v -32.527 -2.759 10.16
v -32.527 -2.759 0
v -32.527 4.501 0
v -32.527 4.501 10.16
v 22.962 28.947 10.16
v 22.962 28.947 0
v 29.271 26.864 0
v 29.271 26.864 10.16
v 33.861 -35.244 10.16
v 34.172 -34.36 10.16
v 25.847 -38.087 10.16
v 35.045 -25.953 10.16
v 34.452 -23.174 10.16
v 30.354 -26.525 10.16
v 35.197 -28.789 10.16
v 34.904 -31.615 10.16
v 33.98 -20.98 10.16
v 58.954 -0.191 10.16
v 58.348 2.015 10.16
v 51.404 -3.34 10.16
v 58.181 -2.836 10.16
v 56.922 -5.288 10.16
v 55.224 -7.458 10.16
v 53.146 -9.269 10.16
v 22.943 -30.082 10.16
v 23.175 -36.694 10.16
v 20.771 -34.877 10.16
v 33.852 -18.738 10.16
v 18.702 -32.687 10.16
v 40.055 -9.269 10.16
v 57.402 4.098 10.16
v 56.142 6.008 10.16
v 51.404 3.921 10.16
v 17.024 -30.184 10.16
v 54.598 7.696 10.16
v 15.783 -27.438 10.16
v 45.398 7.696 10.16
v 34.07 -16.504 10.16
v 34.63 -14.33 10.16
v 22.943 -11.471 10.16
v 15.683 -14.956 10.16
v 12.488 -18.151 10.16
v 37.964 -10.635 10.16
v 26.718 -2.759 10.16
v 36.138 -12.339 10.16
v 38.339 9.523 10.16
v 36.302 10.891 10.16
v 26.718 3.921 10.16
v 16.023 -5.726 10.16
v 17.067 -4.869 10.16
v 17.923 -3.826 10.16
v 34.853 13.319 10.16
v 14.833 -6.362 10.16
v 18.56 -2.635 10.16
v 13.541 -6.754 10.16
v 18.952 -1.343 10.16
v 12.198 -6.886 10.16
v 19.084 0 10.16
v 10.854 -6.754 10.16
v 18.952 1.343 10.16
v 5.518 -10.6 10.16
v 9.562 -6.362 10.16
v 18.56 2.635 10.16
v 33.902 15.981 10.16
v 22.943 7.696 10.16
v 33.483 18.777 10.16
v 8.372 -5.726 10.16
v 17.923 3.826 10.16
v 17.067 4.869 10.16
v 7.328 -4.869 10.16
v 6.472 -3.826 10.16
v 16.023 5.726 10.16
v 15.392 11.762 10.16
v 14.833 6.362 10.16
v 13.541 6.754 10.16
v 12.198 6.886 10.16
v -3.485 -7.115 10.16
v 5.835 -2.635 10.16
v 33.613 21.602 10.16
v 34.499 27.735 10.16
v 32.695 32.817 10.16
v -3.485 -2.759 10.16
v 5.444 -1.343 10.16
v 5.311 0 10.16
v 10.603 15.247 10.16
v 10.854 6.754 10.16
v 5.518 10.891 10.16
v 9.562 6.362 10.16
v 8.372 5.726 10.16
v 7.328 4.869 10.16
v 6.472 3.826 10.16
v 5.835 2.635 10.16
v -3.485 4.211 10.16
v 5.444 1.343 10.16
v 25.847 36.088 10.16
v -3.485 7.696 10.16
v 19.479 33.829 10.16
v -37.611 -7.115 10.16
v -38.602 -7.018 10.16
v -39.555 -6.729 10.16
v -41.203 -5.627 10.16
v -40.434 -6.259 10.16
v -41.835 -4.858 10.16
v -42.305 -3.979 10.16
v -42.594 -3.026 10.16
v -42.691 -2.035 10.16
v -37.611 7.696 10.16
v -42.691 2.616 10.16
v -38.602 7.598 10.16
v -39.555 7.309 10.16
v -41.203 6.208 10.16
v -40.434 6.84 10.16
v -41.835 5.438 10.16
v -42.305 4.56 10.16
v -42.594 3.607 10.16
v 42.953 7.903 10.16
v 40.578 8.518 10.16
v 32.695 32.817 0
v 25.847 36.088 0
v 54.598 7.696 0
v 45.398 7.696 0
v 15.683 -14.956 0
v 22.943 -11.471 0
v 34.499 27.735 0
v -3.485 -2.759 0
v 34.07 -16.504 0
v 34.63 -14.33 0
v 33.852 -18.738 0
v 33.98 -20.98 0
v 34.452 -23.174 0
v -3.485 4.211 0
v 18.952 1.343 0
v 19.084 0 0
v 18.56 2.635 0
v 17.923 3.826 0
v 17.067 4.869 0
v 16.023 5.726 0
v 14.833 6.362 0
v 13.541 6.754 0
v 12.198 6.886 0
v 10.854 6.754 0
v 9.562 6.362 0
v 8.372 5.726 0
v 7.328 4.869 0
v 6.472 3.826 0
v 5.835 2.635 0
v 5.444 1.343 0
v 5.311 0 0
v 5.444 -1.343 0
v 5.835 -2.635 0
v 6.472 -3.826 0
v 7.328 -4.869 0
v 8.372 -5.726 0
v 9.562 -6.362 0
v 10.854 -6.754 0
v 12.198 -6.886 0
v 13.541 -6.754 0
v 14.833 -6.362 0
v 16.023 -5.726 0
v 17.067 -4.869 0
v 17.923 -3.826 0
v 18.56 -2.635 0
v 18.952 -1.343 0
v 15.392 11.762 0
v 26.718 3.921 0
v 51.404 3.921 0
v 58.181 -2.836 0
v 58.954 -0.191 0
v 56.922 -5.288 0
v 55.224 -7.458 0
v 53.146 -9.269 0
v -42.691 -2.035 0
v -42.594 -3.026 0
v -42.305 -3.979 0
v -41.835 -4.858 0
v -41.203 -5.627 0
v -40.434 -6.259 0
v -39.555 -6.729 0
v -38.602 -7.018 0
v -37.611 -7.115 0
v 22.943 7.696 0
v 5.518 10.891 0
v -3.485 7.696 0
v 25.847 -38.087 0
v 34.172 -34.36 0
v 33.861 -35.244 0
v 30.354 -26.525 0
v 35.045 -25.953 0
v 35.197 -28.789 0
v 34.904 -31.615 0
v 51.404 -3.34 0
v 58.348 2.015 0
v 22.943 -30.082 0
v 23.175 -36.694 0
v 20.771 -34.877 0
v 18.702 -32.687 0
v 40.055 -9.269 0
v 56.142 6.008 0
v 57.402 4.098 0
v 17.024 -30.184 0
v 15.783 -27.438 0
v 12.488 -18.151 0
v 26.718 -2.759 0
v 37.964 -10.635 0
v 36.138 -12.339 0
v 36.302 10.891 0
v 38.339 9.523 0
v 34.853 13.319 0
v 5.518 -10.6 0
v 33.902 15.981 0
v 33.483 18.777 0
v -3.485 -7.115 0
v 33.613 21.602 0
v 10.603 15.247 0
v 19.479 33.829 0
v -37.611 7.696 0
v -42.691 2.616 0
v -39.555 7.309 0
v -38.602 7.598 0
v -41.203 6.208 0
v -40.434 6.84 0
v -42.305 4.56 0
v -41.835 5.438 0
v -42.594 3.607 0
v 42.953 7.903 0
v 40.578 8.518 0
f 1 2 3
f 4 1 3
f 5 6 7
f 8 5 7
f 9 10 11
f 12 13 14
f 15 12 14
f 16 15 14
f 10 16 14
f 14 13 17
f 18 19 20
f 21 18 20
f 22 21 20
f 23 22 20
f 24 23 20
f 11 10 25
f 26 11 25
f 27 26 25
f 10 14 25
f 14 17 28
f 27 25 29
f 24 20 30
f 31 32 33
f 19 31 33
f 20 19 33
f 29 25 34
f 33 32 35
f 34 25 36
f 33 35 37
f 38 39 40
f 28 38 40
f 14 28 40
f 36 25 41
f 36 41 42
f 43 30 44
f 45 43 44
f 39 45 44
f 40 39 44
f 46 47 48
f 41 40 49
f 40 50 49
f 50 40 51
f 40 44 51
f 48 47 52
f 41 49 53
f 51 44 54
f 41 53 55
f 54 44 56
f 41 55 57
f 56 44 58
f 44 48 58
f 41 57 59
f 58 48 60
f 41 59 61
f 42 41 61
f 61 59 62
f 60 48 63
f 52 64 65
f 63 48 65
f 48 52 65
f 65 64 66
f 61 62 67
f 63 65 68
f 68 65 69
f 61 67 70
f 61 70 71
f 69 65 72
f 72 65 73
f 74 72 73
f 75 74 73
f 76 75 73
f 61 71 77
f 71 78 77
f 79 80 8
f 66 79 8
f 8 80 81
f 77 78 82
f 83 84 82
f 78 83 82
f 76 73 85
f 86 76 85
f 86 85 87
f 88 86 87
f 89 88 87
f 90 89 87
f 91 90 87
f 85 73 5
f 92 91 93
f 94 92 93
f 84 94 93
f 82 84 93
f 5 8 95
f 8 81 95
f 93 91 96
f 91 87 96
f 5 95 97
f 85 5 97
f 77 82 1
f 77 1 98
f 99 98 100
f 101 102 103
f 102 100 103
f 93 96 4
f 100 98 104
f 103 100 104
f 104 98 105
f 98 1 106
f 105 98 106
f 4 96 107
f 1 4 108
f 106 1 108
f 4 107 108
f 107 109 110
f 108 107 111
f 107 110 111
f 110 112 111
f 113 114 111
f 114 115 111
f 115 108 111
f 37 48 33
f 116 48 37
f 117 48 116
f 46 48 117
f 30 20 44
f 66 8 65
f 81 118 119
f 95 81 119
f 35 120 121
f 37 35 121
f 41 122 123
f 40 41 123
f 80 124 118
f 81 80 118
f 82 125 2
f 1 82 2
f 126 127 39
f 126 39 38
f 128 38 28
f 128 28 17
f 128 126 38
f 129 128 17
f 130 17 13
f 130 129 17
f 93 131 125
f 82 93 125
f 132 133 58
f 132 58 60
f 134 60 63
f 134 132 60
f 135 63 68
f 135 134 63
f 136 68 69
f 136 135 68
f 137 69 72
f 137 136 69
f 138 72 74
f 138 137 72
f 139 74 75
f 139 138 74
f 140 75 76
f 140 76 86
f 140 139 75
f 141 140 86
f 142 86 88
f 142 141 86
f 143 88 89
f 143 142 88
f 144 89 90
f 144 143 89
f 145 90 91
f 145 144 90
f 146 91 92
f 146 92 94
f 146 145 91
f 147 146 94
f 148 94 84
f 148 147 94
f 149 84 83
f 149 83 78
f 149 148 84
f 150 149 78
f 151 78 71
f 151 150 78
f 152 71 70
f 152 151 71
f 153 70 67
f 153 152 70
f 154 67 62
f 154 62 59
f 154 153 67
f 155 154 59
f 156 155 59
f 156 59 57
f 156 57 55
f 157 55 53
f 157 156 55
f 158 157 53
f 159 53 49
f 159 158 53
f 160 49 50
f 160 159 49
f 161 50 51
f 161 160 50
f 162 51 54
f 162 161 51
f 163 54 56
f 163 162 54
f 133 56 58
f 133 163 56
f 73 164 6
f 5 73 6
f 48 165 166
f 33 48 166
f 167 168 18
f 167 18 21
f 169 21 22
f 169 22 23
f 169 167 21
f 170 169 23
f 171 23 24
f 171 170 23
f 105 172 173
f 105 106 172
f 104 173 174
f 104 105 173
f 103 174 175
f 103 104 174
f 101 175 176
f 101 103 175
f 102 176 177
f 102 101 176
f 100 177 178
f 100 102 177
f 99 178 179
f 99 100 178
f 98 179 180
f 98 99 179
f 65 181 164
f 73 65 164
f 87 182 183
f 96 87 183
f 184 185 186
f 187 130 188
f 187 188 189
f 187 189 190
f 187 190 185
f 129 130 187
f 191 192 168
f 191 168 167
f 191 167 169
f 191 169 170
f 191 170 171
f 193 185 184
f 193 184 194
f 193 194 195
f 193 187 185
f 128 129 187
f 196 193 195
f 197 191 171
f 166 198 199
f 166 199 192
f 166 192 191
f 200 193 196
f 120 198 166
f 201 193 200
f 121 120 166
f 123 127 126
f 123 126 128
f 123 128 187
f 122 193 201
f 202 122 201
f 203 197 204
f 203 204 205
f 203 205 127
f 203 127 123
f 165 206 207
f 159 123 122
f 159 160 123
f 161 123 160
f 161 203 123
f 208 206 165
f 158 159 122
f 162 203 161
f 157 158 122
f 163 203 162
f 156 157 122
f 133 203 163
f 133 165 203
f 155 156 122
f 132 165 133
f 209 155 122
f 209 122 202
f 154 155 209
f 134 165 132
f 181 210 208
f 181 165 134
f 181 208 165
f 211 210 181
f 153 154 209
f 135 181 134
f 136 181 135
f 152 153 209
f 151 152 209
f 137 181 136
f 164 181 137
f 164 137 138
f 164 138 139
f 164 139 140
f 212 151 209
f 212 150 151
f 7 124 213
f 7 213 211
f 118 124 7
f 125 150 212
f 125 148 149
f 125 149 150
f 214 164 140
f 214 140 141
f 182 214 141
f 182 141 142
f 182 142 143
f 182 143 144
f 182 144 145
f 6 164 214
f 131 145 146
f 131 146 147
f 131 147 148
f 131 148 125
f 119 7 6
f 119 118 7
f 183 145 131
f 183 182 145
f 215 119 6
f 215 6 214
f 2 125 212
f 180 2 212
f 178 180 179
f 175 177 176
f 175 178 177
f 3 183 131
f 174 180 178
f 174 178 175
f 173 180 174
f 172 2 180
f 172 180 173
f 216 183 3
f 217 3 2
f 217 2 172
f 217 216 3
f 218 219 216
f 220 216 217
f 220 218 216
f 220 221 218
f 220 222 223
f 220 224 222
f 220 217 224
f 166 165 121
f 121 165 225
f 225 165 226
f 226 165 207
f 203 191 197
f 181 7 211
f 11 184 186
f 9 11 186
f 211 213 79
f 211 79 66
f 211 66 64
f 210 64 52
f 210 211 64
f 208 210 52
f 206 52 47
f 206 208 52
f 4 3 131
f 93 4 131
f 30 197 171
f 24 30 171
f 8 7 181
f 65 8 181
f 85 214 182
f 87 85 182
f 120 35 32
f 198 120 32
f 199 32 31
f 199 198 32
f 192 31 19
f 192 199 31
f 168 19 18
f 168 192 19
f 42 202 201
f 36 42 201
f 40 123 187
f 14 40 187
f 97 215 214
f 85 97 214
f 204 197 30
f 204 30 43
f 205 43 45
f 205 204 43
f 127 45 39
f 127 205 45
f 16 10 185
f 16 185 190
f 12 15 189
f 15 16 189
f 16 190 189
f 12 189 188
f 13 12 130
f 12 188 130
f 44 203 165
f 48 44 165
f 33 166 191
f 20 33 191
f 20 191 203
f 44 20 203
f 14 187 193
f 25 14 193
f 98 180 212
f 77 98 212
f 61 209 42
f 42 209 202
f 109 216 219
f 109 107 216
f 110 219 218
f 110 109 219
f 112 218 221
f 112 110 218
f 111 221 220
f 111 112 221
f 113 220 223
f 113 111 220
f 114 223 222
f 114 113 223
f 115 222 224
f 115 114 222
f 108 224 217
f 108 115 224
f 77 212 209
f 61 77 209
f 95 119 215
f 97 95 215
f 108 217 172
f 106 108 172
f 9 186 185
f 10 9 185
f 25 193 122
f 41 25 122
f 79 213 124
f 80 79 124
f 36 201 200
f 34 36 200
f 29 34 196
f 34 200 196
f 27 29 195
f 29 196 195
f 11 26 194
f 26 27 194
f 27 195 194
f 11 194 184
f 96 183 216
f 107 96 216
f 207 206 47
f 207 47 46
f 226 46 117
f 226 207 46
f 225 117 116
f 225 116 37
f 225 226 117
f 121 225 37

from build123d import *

# Parameters (mm, degrees)
F0_R        = 6.8863244876
F1_DEPTH    = 10.16
F2_T1_DEPTH = 66.6590982347
F2_T3_DEPTH = 42.201240443
F3_T1_DEPTH = 10.16
F3_T3_DEPTH = 58.4926144872
F3_T5_DEPTH = 51.6908183144
F4_R        = 5.08


# Not quite as in the source:
# - a fillet or chamfer that OpenCascade refuses, or shapes differently, is made with other operations: its cross-section is extruded or revolved along the edge and cut away or added


with BuildPart() as f1:
    # F0 (on Top) → F1 (new body)
    with BuildSketch(Plane.XY):
        Polygon((10.6026988985, 15.246915631), (5.517931655, 10.8906533569), (-3.485009307, 7.6960618608), (-42.6913611591, 7.6960618608), (-42.6913611591, -7.1152271703), (-3.485009307, -7.1152271703), (5.517931655, -10.6002362445), (12.4879479408, -18.1510895491), (19.5621072062, -38.0873594287), (25.8471500129, -38.0873594287), (33.8609059311, -35.2437690269), (36.3021790981, -28.315698728), (32.69538281, -18.1510895491), (36.3021790981, -10.6002362445), (40.0547920587, -9.2686640946), (53.1463883817, -9.2686640946), (59.2151660388, -7.1152271703), (59.2151660388, 5.3727226332), (54.5984730124, 7.6960618608), (40.0547920587, 7.6960618608), (36.3021790981, 10.8906533569), (32.69538281, 15.246915631), (34.4987809541, 27.7348645031), (32.69538281, 32.8171690926), (25.8471500129, 36.0883464863), (19.4785206028, 33.8285105681), align=None)
        Polygon((15.6825426966, -14.9564975873), (22.9429770261, -11.4714885131), (30.3544697336, -26.5248827454), (22.9429770261, -30.0823998534), align=None, mode=Mode.SUBTRACT)
        Polygon((-32.5267501175, -2.7589655947), (-32.5267501175, 4.501469899), (-3.485009307, 4.2110527866), (-3.485009307, -2.7589655947), align=None, mode=Mode.SUBTRACT)
        with Locations((12.1975308284, 0)):
            Circle(F0_R, mode=Mode.SUBTRACT)
        Polygon((51.4038838446, -3.339800518), (26.7184022814, -2.7589655947), (26.7184022814, 3.9206352085), (51.4038838446, 3.9206352085), align=None, mode=Mode.SUBTRACT)
        Polygon((22.9429770261, 7.6960618608), (15.3921246529, 11.7619056255), (22.962263142, 28.9465700275), (29.2712664114, 26.8636122346), align=None, mode=Mode.SUBTRACT)
    extrude(amount=F1_DEPTH)

    # F2: fillet of radius 18.1225687259 on 2 edges, made by hand

    # F2_s2 → F2_t1 (cut)
    with BuildSketch(Plane.XY.offset(-28.2495491174)):
        with BuildLine():
            ThreePointArc((15.7833367489, -27.4380957037), (19.6910161344, -33.825149661), (25.8471500129, -38.0873594287))
            Line((25.8471500129, -38.0873594287), (19.5621072062, -38.0873594287))
            Line((19.5621072062, -38.0873594287), (15.7833367489, -27.4380957037))
        make_face()
    extrude(amount=F2_T1_DEPTH, mode=Mode.SUBTRACT)

    # F2_s4 → F2_t3 (cut)
    with BuildSketch(Plane.XY.offset(-16.0206202215)):
        with BuildLine():
            ThreePointArc((34.1724327506, -34.3596894675), (35.202544115, -28.3169031391), (34.15919812, -22.2763878325))
            Line((34.15919812, -22.2763878325), (36.3021790981, -28.315698728))
            Line((36.3021790981, -28.315698728), (34.1724327506, -34.3596894675))
        make_face()
    extrude(amount=F2_T3_DEPTH, mode=Mode.SUBTRACT)

    # F3: fillet of radius 14.545063472 on 6 edges, made by hand

    # F3_s2 → F3_t1 (join)
    with BuildSketch(Plane.XY):
        with BuildLine():
            ThreePointArc((33.6130817468, 21.6016839559), (33.901548417, 15.9810300876), (36.3021790981, 10.8906533569))
            Line((36.3021790981, 10.8906533569), (32.69538281, 15.246915631))
            Line((32.69538281, 15.246915631), (33.6130817468, 21.6016839559))
        make_face()
        with BuildLine():
            ThreePointArc((36.3021790981, 10.8906533569), (40.5775055267, 8.5179295182), (45.3975437049, 7.6960618608))
            Line((45.3975437049, 7.6960618608), (40.0547920587, 7.6960618608))
            Line((40.0547920587, 7.6960618608), (36.3021790981, 10.8906533569))
        make_face()
        with BuildLine():
            ThreePointArc((35.2695823203, -12.7619848351), (33.8938078195, -17.8922695477), (34.4517445702, -23.1744360815))
            Line((34.4517445702, -23.1744360815), (33.0574978105, -23.5887604555))
            ThreePointArc((33.0574978105, -23.5887604555), (32.7884309604, -22.7627890129), (31.3246156504, -18.6374907295))
            Line((31.3246156504, -18.6374907295), (31.3829198252, -17.5241687984))
            Line((31.3829198252, -17.5241687984), (33.9571193355, -12.1350640844))
            Line((33.9571193355, -12.1350640844), (35.2695823203, -12.7619848351))
        make_face()
        with BuildLine():
            ThreePointArc((40.0547920587, -9.2686640946), (36.4117244984, -12.043489977), (33.8119770372, -15.8134917097))
            Line((33.8119770372, -15.8134917097), (36.3021790981, -10.6002362445))
            Line((36.3021790981, -10.6002362445), (40.0547920587, -9.2686640946))
        make_face()
    extrude(amount=F3_T1_DEPTH)

    # F3_s4 → F3_t3 (cut)
    with BuildSketch(Plane.XY.offset(-24.1663072436)):
        with BuildLine():
            ThreePointArc((59.2151660388, 2.5512957272), (57.6093256229, -4.0921505253), (53.1463883817, -9.2686640946))
            Line((53.1463883817, -9.2686640946), (59.2151660388, -7.1152271703))
            Line((59.2151660388, -7.1152271703), (59.2151660388, 2.5512957272))
        make_face()
    extrude(amount=F3_T3_DEPTH, mode=Mode.SUBTRACT)

    # F3_s6 → F3_t5 (cut)
    with BuildSketch(Plane.XY.offset(-20.7654091572)):
        with BuildLine():
            ThreePointArc((54.5984730124, 7.6960618608), (58.011160428, 2.8609568294), (59.2151660388, -2.9334410297))
            Line((59.2151660388, -2.9334410297), (59.2151660388, 5.3727226332))
            Line((59.2151660388, 5.3727226332), (54.5984730124, 7.6960618608))
        make_face()
    extrude(amount=F3_T5_DEPTH, mode=Mode.SUBTRACT)

    # F4
    f4_edges = [f1.edges().sort_by_distance(p)[0] for p in [
        (-42.691361, 7.696062, 5.08),
        (-42.691361, -7.115227, 5.08),
    ]]
    fillet(f4_edges, radius=F4_R)


solid = f1.part
